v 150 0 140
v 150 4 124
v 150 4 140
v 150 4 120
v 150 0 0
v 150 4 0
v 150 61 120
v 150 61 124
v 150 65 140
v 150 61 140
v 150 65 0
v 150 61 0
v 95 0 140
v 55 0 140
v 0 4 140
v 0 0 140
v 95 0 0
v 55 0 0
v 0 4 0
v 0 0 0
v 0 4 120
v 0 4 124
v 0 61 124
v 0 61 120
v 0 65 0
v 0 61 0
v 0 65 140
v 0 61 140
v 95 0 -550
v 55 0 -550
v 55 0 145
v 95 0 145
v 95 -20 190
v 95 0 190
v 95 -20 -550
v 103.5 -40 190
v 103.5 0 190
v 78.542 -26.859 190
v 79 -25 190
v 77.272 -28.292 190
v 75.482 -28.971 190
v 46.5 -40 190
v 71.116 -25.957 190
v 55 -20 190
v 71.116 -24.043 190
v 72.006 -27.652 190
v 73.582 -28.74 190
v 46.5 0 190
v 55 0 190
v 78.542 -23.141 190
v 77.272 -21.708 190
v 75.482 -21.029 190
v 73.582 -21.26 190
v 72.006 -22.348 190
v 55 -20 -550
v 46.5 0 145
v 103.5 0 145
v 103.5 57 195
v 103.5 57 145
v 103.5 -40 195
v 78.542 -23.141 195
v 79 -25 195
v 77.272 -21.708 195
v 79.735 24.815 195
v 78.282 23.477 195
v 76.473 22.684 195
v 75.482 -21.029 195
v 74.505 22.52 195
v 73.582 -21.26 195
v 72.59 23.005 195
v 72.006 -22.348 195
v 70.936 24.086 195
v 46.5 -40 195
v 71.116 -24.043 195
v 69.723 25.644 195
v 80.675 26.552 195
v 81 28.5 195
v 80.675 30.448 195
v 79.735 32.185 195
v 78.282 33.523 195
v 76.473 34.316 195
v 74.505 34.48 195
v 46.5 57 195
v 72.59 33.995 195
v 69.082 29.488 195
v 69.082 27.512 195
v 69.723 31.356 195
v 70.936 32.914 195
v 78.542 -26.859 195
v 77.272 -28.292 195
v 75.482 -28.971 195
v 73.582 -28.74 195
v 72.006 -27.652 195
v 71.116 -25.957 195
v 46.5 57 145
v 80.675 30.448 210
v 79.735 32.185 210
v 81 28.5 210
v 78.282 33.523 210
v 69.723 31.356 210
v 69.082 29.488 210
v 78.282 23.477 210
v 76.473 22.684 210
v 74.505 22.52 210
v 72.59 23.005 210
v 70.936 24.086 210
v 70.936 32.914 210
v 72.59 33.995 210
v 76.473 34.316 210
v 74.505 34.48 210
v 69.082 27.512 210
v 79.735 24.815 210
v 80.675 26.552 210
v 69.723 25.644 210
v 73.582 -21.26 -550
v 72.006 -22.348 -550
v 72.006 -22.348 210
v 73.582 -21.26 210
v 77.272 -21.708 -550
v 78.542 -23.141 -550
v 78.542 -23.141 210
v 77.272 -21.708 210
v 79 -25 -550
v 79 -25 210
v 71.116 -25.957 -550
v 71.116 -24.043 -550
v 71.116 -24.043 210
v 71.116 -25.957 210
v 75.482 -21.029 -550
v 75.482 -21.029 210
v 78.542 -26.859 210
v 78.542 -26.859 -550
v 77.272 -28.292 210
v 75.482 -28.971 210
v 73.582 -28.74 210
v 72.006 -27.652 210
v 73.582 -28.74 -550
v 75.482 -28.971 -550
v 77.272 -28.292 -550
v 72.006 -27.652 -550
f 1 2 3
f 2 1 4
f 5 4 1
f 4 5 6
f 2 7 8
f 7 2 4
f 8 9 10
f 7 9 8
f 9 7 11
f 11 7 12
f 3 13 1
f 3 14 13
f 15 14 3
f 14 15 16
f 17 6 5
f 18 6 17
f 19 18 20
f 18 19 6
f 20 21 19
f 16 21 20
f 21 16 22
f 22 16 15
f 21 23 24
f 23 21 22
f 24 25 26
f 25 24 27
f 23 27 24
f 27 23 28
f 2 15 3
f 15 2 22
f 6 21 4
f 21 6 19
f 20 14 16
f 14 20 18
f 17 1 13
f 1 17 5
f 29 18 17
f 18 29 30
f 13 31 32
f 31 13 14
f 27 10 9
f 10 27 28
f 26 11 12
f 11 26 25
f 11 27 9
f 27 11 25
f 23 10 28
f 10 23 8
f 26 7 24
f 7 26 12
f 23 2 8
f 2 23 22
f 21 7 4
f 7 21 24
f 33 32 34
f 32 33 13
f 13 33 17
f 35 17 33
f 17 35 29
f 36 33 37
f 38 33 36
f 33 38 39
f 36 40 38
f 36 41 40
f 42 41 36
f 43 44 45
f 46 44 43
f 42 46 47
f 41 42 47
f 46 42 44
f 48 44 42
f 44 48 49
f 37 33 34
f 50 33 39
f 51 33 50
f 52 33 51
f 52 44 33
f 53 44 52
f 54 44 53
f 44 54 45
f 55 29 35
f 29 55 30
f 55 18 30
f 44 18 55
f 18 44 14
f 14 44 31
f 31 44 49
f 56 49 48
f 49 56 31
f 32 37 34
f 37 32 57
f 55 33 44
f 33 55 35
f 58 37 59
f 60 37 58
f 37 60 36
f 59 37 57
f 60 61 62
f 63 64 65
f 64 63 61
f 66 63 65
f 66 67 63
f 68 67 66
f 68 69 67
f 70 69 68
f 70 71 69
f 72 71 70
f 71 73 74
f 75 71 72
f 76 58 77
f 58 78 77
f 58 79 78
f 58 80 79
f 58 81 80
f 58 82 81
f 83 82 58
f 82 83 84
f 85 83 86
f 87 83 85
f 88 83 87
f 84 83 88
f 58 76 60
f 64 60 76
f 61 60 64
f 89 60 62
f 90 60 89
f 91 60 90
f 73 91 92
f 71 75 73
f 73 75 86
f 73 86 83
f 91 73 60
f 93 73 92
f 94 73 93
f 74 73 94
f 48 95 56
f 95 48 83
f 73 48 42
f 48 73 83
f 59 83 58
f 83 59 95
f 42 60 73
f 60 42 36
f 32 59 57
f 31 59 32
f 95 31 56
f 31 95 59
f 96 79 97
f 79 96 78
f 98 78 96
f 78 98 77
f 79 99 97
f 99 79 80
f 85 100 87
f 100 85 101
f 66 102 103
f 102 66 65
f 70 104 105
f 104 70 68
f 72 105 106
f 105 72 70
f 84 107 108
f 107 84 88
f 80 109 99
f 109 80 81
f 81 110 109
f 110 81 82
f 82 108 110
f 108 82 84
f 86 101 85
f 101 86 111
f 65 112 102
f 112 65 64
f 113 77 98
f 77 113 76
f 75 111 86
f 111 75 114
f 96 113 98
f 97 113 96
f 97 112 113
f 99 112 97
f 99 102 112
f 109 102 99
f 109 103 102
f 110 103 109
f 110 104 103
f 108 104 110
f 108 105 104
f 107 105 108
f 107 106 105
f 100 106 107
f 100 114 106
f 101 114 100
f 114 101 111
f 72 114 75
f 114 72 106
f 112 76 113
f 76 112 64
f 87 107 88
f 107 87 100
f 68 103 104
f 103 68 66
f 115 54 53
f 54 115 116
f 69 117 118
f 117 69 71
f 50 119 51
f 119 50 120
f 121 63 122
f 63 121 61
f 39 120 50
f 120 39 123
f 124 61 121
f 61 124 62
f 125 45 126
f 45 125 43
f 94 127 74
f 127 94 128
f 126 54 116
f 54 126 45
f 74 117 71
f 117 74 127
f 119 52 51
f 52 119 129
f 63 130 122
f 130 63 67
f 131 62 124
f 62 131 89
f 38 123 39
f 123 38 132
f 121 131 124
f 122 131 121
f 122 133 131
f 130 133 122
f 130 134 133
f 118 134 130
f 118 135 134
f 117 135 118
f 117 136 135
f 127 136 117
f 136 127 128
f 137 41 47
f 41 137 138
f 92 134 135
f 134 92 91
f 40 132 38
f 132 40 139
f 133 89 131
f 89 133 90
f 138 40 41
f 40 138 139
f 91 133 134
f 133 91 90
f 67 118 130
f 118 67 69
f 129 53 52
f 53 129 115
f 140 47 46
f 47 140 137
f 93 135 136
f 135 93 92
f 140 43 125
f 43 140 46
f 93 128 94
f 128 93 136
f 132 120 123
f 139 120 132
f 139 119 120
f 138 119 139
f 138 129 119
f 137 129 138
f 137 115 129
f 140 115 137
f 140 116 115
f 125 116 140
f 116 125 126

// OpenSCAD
// file: xcarve-vwheel.scad
module vwheel(spacer)
{
        color("grey") {
                translate([0, 0, 10]) cylinder(r=12, h=10);
                cylinder(r=5, h=spacer);
        }
}
// file: ../Common/nema.scad
module nema_motor(w, d, length)
{
        color("black") {
                translate([-w/2, -w/2, 0])
                        cube([w, w, length]);
        }
        color("lightgray") {
                cylinder(r=d, h=length+20);
        }
}

module nema23_motor(length)
{
        nema_motor(57, 6, length);
}

function nema34_dim() = 85.85;

module nema34_motor(length)
{
        nema_motor(nema34_dim(), 7, length);
}

function nema42_dim() = 110;

module nema42_motor(length)
{
        nema_motor(110, 8.5, length);
}

module nema23_phidget_3332_0()
{
        color("black") {
                translate([-57/2, -57/2, 48+28])
                        cube([57, 57, 56]);
                translate([0, 0, 28])
                    cylinder(r=26, h=48);
        }
        color("lightgray") {
                cylinder(r=6, h=26);
                translate([0, 0, 26])
                    cylinder(r=16, h=2);
        }        
}
// file: xcarve-z-carriage.scad
use <xcarve-vwheel.scad>

module weedingtool(length)
{
        color("yellow") {
                translate([-50, -100, -50])
                cube([100, 100, 100]);
        }
        color("grey") {
                translate([0, -50, -length-50])
                cylinder(r=16, h=length);
        }
}

module z_carriage(height, tool_length, invert)
{
        translate([70, 0, 70]) 
                rotate([0, invert? 180 : 0, 0])
                weedingtool(tool_length);
        color("black") {
                cube([140, 4, 140]);
        }
        translate([40, 4, 20]) 
                rotate([-90, 0, 0])
                vwheel(10);
        translate([40, 4, 120]) 
                rotate([-90, 0, 0])
                vwheel(10);
        translate([140-40, 4, 20]) 
                rotate([-90, 0, 0])
                vwheel(10);
        translate([140-40, 4, 120]) 
                rotate([-90, 0, 0])
                vwheel(10);
}

z_carriage(600, 600);
// main file
use <xcarve-z-carriage.scad>
use <../Common/nema.scad>

module leadscrew(length)
{
        color("lightgray") {
                cylinder(r=4, h=length);
        }
}

module x_carriage(height, tool_length, z, invert)
{
        color("black") {
                // plates
                translate([0, 0, 0]) cube([150, 4, 140]);
                translate([0, 61, 0]) cube([150, 4, 140]);
                translate([0, 0, 120]) cube([150, 65, 4]);
        }

        translate([0, 0, 50]) {
                color("black") {
                        // z-axis makeslide 
                        translate([55, -20, -height])
                                cube([40, 20, height+140]);

                        // motor plate
                        translate([(150-57)/2, -40, 140])
                                cube([57, 97, 5]);
                }
                translate([75, -25, -height]) 
                        leadscrew(height+140+20);

                translate([57/2+(150-57)/2, 57/2, 140-45])
                        nema23_motor(45);
                *translate([5, -35, -z])
                        z_carriage(height, tool_length, invert);
        }
        
}

x_carriage(600, 200, 0, 0);
